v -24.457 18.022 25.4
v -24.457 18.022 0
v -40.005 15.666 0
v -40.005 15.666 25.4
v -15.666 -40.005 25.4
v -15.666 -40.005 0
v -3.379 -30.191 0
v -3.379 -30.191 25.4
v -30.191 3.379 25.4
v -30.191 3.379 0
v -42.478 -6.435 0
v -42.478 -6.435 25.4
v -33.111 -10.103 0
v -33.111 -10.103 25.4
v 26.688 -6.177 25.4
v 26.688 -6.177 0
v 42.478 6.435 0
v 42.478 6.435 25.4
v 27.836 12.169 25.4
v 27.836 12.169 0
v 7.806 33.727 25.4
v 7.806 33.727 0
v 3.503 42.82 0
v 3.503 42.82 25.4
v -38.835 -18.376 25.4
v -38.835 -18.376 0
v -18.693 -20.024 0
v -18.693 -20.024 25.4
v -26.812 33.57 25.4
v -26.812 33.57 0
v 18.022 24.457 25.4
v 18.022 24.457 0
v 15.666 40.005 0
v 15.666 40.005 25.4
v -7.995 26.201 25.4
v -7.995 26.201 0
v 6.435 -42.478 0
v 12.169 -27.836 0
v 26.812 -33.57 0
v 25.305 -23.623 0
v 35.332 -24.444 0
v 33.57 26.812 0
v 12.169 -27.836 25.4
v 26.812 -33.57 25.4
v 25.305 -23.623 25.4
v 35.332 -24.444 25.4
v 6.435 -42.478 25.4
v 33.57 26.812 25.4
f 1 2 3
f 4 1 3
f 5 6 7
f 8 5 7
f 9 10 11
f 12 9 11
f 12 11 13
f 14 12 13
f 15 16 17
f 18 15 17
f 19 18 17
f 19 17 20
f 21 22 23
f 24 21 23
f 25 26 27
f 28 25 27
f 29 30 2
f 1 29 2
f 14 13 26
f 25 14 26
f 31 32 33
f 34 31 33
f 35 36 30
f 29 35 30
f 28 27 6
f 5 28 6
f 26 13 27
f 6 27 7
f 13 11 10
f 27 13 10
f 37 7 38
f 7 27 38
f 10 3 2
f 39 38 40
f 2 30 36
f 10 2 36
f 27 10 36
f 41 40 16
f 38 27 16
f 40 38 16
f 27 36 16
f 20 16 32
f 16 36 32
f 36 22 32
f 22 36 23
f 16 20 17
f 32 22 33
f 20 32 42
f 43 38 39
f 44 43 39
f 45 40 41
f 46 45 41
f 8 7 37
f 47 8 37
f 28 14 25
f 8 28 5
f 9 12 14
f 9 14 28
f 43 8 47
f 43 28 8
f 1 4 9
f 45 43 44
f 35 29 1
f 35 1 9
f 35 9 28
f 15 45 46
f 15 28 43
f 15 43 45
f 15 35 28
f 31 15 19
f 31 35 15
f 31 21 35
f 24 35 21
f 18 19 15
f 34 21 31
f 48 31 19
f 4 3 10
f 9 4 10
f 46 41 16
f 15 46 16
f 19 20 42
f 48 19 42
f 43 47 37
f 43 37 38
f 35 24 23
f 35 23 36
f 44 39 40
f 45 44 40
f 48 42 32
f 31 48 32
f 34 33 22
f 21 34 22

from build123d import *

# Parameters (mm, degrees)
F1_DEPTH = 25.4


with BuildPart() as f1:
    # F0 (on Top) → F1 (new body)
    with BuildSketch(Plane.XY):
        Polygon((27.8356494382, 12.1693564579), (33.5699106521, 26.8122048944), (18.0217013154, 24.4567965593), (19.3815969517, 15.4800337134), align=None)
        Polygon((42.4784978747, 6.435095244), (27.8356494382, 12.1693564579), (23.3848302984, 0.8038696669), (26.688019605, -6.1767208295), align=None)
        Polygon((23.3848302984, 0.8038696669), (27.8356494382, 12.1693564579), (19.3815969517, 15.4800337134), (20.7667316179, 6.3366663281), align=None)
        Polygon((19.3815969517, 15.4800337134), (18.0217013154, 24.4567965593), (12.5822778175, 23.6327747593), (15.7710654967, 16.8939478554), align=None)
        Polygon((12.5822778175, 23.6327747593), (18.0217013154, 24.4567965593), (15.6662929803, 40.0050058961), (7.8057995659, 33.7268491806), align=None)
        Polygon((26.688019605, -6.1767208295), (23.3848302984, 0.8038696669), (22.1013882243, -2.4734919786), (23.096900923, -9.0449384694), align=None)
        Polygon((2.4734919786, 22.1013882243), (12.5822778175, 23.6327747593), (7.8057995659, 33.7268491806), (-3.7153039714, 24.5249721827), align=None)
        Polygon((35.3318663109, -24.443658799), (26.688019605, -6.1767208295), (23.096900923, -9.0449384694), (25.3054083971, -23.6234453112), align=None)
        Polygon((-3.7153039714, 24.5249721827), (7.8057995659, 33.7268491806), (3.502896326, 42.8201231878), (-7.9948126521, 26.2008633694), align=None)
        Polygon((23.096900923, -9.0449384694), (17.9036176718, -13.1928010017), (14.1754443947, -22.7129596071), (25.3054083971, -23.6234453112), align=None)
        Polygon((-12.388586702, 19.8499222681), (-8.9085872226, 20.3771096504), (-3.7153039714, 24.5249721827), (-7.9948126521, 26.2008633694), align=None)
        Polygon((25.3054083971, -23.6234453112), (14.1754443947, -22.7129596071), (12.1693564579, -27.8356494382), (26.8122048944, -33.5699106521), align=None)
        Polygon((12.1693564579, -27.8356494382), (14.1754443947, -22.7129596071), (6.7450552646, -22.1051172926), (3.7153039714, -24.5249721827), align=None)
        Polygon((-15.8710798244, 14.8161839706), (-12.388586702, 19.8499222681), (-24.4567965593, 18.0217013154), (-23.096900923, 9.0449384694), align=None)
        Polygon((-24.4567965593, 18.0217013154), (-12.388586702, 19.8499222681), (-7.9948126521, 26.2008633694), (-26.8122048944, 33.5699106521), align=None)
        Polygon((6.435095244, -42.4784978747), (12.1693564579, -27.8356494382), (3.7153039714, -24.5249721827), (-3.3788528789, -30.1910577733), align=None)
        Polygon((3.7153039714, -24.5249721827), (-4.8956517935, -21.1528502987), (-10.9962435963, -20.653791935), (-3.3788528789, -30.1910577733), align=None)
        Polygon((-23.096900923, 9.0449384694), (-24.4567965593, 18.0217013154), (-40.0050058961, 15.6662929803), (-30.1910577733, 3.3788528789), align=None)
        Polygon((-26.7577222122, -0.9198151522), (-22.5161207613, 5.2111694372), (-23.096900923, 9.0449384694), (-30.1910577733, 3.3788528789), align=None)
        Polygon((-18.693206953, -20.0241425399), (-10.9962435963, -20.653791935), (-13.1928010017, -17.9036176718), (-19.3815969517, -15.4800337134), align=None)
        Polygon((-3.3788528789, -30.1910577733), (-10.9962435963, -20.653791935), (-18.693206953, -20.0241425399), (-15.6662929803, -40.0050058961), align=None)
        Polygon((-33.111207963, -10.1034038694), (-26.7577222122, -0.9198151522), (-30.1910577733, 3.3788528789), (-42.4784978747, -6.435095244), align=None)
        Polygon((-20.3771096504, -8.9085872226), (-26.7577222122, -0.9198151522), (-33.111207963, -10.1034038694), (-19.3815969517, -15.4800337134), align=None)
        Polygon((-38.8347626368, -18.3764643888), (-18.693206953, -20.0241425399), (-19.3815969517, -15.4800337134), (-33.111207963, -10.1034038694), align=None)
        Polygon((17.9036176718, -13.1928010017), (22.1013882243, -2.4734919786), (20.7667316179, 6.3366663281), (15.7710654967, 16.8939478554), (2.4734919786, 22.1013882243), (-8.9085872226, 20.3771096504), (-15.8710798244, 14.8161839706), (-22.5161207613, 5.2111694372), (-20.3771096504, -8.9085872226), (-13.1928010017, -17.9036176718), (-4.8956517935, -21.1528502987), (6.7450552646, -22.1051172926), align=None)
        Polygon((15.7710654967, 16.8939478554), (12.5822778175, 23.6327747593), (2.4734919786, 22.1013882243), align=None)
        Polygon((20.7667316179, 6.3366663281), (19.3815969517, 15.4800337134), (15.7710654967, 16.8939478554), align=None)
        Polygon((22.1013882243, -2.4734919786), (23.3848302984, 0.8038696669), (20.7667316179, 6.3366663281), align=None)
        Polygon((23.096900923, -9.0449384694), (22.1013882243, -2.4734919786), (17.9036176718, -13.1928010017), align=None)
        Polygon((14.1754443947, -22.7129596071), (17.9036176718, -13.1928010017), (6.7450552646, -22.1051172926), align=None)
        Polygon((3.7153039714, -24.5249721827), (6.7450552646, -22.1051172926), (-4.8956517935, -21.1528502987), align=None)
        Polygon((-10.9962435963, -20.653791935), (-4.8956517935, -21.1528502987), (-13.1928010017, -17.9036176718), align=None)
        Polygon((-19.3815969517, -15.4800337134), (-13.1928010017, -17.9036176718), (-20.3771096504, -8.9085872226), align=None)
        Polygon((-20.3771096504, -8.9085872226), (-22.5161207613, 5.2111694372), (-26.7577222122, -0.9198151522), align=None)
        Polygon((-22.5161207613, 5.2111694372), (-15.8710798244, 14.8161839706), (-23.096900923, 9.0449384694), align=None)
        Polygon((-15.8710798244, 14.8161839706), (-8.9085872226, 20.3771096504), (-12.388586702, 19.8499222681), align=None)
        Polygon((-8.9085872226, 20.3771096504), (2.4734919786, 22.1013882243), (-3.7153039714, 24.5249721827), align=None)
    extrude(amount=F1_DEPTH)


solid = f1.part
